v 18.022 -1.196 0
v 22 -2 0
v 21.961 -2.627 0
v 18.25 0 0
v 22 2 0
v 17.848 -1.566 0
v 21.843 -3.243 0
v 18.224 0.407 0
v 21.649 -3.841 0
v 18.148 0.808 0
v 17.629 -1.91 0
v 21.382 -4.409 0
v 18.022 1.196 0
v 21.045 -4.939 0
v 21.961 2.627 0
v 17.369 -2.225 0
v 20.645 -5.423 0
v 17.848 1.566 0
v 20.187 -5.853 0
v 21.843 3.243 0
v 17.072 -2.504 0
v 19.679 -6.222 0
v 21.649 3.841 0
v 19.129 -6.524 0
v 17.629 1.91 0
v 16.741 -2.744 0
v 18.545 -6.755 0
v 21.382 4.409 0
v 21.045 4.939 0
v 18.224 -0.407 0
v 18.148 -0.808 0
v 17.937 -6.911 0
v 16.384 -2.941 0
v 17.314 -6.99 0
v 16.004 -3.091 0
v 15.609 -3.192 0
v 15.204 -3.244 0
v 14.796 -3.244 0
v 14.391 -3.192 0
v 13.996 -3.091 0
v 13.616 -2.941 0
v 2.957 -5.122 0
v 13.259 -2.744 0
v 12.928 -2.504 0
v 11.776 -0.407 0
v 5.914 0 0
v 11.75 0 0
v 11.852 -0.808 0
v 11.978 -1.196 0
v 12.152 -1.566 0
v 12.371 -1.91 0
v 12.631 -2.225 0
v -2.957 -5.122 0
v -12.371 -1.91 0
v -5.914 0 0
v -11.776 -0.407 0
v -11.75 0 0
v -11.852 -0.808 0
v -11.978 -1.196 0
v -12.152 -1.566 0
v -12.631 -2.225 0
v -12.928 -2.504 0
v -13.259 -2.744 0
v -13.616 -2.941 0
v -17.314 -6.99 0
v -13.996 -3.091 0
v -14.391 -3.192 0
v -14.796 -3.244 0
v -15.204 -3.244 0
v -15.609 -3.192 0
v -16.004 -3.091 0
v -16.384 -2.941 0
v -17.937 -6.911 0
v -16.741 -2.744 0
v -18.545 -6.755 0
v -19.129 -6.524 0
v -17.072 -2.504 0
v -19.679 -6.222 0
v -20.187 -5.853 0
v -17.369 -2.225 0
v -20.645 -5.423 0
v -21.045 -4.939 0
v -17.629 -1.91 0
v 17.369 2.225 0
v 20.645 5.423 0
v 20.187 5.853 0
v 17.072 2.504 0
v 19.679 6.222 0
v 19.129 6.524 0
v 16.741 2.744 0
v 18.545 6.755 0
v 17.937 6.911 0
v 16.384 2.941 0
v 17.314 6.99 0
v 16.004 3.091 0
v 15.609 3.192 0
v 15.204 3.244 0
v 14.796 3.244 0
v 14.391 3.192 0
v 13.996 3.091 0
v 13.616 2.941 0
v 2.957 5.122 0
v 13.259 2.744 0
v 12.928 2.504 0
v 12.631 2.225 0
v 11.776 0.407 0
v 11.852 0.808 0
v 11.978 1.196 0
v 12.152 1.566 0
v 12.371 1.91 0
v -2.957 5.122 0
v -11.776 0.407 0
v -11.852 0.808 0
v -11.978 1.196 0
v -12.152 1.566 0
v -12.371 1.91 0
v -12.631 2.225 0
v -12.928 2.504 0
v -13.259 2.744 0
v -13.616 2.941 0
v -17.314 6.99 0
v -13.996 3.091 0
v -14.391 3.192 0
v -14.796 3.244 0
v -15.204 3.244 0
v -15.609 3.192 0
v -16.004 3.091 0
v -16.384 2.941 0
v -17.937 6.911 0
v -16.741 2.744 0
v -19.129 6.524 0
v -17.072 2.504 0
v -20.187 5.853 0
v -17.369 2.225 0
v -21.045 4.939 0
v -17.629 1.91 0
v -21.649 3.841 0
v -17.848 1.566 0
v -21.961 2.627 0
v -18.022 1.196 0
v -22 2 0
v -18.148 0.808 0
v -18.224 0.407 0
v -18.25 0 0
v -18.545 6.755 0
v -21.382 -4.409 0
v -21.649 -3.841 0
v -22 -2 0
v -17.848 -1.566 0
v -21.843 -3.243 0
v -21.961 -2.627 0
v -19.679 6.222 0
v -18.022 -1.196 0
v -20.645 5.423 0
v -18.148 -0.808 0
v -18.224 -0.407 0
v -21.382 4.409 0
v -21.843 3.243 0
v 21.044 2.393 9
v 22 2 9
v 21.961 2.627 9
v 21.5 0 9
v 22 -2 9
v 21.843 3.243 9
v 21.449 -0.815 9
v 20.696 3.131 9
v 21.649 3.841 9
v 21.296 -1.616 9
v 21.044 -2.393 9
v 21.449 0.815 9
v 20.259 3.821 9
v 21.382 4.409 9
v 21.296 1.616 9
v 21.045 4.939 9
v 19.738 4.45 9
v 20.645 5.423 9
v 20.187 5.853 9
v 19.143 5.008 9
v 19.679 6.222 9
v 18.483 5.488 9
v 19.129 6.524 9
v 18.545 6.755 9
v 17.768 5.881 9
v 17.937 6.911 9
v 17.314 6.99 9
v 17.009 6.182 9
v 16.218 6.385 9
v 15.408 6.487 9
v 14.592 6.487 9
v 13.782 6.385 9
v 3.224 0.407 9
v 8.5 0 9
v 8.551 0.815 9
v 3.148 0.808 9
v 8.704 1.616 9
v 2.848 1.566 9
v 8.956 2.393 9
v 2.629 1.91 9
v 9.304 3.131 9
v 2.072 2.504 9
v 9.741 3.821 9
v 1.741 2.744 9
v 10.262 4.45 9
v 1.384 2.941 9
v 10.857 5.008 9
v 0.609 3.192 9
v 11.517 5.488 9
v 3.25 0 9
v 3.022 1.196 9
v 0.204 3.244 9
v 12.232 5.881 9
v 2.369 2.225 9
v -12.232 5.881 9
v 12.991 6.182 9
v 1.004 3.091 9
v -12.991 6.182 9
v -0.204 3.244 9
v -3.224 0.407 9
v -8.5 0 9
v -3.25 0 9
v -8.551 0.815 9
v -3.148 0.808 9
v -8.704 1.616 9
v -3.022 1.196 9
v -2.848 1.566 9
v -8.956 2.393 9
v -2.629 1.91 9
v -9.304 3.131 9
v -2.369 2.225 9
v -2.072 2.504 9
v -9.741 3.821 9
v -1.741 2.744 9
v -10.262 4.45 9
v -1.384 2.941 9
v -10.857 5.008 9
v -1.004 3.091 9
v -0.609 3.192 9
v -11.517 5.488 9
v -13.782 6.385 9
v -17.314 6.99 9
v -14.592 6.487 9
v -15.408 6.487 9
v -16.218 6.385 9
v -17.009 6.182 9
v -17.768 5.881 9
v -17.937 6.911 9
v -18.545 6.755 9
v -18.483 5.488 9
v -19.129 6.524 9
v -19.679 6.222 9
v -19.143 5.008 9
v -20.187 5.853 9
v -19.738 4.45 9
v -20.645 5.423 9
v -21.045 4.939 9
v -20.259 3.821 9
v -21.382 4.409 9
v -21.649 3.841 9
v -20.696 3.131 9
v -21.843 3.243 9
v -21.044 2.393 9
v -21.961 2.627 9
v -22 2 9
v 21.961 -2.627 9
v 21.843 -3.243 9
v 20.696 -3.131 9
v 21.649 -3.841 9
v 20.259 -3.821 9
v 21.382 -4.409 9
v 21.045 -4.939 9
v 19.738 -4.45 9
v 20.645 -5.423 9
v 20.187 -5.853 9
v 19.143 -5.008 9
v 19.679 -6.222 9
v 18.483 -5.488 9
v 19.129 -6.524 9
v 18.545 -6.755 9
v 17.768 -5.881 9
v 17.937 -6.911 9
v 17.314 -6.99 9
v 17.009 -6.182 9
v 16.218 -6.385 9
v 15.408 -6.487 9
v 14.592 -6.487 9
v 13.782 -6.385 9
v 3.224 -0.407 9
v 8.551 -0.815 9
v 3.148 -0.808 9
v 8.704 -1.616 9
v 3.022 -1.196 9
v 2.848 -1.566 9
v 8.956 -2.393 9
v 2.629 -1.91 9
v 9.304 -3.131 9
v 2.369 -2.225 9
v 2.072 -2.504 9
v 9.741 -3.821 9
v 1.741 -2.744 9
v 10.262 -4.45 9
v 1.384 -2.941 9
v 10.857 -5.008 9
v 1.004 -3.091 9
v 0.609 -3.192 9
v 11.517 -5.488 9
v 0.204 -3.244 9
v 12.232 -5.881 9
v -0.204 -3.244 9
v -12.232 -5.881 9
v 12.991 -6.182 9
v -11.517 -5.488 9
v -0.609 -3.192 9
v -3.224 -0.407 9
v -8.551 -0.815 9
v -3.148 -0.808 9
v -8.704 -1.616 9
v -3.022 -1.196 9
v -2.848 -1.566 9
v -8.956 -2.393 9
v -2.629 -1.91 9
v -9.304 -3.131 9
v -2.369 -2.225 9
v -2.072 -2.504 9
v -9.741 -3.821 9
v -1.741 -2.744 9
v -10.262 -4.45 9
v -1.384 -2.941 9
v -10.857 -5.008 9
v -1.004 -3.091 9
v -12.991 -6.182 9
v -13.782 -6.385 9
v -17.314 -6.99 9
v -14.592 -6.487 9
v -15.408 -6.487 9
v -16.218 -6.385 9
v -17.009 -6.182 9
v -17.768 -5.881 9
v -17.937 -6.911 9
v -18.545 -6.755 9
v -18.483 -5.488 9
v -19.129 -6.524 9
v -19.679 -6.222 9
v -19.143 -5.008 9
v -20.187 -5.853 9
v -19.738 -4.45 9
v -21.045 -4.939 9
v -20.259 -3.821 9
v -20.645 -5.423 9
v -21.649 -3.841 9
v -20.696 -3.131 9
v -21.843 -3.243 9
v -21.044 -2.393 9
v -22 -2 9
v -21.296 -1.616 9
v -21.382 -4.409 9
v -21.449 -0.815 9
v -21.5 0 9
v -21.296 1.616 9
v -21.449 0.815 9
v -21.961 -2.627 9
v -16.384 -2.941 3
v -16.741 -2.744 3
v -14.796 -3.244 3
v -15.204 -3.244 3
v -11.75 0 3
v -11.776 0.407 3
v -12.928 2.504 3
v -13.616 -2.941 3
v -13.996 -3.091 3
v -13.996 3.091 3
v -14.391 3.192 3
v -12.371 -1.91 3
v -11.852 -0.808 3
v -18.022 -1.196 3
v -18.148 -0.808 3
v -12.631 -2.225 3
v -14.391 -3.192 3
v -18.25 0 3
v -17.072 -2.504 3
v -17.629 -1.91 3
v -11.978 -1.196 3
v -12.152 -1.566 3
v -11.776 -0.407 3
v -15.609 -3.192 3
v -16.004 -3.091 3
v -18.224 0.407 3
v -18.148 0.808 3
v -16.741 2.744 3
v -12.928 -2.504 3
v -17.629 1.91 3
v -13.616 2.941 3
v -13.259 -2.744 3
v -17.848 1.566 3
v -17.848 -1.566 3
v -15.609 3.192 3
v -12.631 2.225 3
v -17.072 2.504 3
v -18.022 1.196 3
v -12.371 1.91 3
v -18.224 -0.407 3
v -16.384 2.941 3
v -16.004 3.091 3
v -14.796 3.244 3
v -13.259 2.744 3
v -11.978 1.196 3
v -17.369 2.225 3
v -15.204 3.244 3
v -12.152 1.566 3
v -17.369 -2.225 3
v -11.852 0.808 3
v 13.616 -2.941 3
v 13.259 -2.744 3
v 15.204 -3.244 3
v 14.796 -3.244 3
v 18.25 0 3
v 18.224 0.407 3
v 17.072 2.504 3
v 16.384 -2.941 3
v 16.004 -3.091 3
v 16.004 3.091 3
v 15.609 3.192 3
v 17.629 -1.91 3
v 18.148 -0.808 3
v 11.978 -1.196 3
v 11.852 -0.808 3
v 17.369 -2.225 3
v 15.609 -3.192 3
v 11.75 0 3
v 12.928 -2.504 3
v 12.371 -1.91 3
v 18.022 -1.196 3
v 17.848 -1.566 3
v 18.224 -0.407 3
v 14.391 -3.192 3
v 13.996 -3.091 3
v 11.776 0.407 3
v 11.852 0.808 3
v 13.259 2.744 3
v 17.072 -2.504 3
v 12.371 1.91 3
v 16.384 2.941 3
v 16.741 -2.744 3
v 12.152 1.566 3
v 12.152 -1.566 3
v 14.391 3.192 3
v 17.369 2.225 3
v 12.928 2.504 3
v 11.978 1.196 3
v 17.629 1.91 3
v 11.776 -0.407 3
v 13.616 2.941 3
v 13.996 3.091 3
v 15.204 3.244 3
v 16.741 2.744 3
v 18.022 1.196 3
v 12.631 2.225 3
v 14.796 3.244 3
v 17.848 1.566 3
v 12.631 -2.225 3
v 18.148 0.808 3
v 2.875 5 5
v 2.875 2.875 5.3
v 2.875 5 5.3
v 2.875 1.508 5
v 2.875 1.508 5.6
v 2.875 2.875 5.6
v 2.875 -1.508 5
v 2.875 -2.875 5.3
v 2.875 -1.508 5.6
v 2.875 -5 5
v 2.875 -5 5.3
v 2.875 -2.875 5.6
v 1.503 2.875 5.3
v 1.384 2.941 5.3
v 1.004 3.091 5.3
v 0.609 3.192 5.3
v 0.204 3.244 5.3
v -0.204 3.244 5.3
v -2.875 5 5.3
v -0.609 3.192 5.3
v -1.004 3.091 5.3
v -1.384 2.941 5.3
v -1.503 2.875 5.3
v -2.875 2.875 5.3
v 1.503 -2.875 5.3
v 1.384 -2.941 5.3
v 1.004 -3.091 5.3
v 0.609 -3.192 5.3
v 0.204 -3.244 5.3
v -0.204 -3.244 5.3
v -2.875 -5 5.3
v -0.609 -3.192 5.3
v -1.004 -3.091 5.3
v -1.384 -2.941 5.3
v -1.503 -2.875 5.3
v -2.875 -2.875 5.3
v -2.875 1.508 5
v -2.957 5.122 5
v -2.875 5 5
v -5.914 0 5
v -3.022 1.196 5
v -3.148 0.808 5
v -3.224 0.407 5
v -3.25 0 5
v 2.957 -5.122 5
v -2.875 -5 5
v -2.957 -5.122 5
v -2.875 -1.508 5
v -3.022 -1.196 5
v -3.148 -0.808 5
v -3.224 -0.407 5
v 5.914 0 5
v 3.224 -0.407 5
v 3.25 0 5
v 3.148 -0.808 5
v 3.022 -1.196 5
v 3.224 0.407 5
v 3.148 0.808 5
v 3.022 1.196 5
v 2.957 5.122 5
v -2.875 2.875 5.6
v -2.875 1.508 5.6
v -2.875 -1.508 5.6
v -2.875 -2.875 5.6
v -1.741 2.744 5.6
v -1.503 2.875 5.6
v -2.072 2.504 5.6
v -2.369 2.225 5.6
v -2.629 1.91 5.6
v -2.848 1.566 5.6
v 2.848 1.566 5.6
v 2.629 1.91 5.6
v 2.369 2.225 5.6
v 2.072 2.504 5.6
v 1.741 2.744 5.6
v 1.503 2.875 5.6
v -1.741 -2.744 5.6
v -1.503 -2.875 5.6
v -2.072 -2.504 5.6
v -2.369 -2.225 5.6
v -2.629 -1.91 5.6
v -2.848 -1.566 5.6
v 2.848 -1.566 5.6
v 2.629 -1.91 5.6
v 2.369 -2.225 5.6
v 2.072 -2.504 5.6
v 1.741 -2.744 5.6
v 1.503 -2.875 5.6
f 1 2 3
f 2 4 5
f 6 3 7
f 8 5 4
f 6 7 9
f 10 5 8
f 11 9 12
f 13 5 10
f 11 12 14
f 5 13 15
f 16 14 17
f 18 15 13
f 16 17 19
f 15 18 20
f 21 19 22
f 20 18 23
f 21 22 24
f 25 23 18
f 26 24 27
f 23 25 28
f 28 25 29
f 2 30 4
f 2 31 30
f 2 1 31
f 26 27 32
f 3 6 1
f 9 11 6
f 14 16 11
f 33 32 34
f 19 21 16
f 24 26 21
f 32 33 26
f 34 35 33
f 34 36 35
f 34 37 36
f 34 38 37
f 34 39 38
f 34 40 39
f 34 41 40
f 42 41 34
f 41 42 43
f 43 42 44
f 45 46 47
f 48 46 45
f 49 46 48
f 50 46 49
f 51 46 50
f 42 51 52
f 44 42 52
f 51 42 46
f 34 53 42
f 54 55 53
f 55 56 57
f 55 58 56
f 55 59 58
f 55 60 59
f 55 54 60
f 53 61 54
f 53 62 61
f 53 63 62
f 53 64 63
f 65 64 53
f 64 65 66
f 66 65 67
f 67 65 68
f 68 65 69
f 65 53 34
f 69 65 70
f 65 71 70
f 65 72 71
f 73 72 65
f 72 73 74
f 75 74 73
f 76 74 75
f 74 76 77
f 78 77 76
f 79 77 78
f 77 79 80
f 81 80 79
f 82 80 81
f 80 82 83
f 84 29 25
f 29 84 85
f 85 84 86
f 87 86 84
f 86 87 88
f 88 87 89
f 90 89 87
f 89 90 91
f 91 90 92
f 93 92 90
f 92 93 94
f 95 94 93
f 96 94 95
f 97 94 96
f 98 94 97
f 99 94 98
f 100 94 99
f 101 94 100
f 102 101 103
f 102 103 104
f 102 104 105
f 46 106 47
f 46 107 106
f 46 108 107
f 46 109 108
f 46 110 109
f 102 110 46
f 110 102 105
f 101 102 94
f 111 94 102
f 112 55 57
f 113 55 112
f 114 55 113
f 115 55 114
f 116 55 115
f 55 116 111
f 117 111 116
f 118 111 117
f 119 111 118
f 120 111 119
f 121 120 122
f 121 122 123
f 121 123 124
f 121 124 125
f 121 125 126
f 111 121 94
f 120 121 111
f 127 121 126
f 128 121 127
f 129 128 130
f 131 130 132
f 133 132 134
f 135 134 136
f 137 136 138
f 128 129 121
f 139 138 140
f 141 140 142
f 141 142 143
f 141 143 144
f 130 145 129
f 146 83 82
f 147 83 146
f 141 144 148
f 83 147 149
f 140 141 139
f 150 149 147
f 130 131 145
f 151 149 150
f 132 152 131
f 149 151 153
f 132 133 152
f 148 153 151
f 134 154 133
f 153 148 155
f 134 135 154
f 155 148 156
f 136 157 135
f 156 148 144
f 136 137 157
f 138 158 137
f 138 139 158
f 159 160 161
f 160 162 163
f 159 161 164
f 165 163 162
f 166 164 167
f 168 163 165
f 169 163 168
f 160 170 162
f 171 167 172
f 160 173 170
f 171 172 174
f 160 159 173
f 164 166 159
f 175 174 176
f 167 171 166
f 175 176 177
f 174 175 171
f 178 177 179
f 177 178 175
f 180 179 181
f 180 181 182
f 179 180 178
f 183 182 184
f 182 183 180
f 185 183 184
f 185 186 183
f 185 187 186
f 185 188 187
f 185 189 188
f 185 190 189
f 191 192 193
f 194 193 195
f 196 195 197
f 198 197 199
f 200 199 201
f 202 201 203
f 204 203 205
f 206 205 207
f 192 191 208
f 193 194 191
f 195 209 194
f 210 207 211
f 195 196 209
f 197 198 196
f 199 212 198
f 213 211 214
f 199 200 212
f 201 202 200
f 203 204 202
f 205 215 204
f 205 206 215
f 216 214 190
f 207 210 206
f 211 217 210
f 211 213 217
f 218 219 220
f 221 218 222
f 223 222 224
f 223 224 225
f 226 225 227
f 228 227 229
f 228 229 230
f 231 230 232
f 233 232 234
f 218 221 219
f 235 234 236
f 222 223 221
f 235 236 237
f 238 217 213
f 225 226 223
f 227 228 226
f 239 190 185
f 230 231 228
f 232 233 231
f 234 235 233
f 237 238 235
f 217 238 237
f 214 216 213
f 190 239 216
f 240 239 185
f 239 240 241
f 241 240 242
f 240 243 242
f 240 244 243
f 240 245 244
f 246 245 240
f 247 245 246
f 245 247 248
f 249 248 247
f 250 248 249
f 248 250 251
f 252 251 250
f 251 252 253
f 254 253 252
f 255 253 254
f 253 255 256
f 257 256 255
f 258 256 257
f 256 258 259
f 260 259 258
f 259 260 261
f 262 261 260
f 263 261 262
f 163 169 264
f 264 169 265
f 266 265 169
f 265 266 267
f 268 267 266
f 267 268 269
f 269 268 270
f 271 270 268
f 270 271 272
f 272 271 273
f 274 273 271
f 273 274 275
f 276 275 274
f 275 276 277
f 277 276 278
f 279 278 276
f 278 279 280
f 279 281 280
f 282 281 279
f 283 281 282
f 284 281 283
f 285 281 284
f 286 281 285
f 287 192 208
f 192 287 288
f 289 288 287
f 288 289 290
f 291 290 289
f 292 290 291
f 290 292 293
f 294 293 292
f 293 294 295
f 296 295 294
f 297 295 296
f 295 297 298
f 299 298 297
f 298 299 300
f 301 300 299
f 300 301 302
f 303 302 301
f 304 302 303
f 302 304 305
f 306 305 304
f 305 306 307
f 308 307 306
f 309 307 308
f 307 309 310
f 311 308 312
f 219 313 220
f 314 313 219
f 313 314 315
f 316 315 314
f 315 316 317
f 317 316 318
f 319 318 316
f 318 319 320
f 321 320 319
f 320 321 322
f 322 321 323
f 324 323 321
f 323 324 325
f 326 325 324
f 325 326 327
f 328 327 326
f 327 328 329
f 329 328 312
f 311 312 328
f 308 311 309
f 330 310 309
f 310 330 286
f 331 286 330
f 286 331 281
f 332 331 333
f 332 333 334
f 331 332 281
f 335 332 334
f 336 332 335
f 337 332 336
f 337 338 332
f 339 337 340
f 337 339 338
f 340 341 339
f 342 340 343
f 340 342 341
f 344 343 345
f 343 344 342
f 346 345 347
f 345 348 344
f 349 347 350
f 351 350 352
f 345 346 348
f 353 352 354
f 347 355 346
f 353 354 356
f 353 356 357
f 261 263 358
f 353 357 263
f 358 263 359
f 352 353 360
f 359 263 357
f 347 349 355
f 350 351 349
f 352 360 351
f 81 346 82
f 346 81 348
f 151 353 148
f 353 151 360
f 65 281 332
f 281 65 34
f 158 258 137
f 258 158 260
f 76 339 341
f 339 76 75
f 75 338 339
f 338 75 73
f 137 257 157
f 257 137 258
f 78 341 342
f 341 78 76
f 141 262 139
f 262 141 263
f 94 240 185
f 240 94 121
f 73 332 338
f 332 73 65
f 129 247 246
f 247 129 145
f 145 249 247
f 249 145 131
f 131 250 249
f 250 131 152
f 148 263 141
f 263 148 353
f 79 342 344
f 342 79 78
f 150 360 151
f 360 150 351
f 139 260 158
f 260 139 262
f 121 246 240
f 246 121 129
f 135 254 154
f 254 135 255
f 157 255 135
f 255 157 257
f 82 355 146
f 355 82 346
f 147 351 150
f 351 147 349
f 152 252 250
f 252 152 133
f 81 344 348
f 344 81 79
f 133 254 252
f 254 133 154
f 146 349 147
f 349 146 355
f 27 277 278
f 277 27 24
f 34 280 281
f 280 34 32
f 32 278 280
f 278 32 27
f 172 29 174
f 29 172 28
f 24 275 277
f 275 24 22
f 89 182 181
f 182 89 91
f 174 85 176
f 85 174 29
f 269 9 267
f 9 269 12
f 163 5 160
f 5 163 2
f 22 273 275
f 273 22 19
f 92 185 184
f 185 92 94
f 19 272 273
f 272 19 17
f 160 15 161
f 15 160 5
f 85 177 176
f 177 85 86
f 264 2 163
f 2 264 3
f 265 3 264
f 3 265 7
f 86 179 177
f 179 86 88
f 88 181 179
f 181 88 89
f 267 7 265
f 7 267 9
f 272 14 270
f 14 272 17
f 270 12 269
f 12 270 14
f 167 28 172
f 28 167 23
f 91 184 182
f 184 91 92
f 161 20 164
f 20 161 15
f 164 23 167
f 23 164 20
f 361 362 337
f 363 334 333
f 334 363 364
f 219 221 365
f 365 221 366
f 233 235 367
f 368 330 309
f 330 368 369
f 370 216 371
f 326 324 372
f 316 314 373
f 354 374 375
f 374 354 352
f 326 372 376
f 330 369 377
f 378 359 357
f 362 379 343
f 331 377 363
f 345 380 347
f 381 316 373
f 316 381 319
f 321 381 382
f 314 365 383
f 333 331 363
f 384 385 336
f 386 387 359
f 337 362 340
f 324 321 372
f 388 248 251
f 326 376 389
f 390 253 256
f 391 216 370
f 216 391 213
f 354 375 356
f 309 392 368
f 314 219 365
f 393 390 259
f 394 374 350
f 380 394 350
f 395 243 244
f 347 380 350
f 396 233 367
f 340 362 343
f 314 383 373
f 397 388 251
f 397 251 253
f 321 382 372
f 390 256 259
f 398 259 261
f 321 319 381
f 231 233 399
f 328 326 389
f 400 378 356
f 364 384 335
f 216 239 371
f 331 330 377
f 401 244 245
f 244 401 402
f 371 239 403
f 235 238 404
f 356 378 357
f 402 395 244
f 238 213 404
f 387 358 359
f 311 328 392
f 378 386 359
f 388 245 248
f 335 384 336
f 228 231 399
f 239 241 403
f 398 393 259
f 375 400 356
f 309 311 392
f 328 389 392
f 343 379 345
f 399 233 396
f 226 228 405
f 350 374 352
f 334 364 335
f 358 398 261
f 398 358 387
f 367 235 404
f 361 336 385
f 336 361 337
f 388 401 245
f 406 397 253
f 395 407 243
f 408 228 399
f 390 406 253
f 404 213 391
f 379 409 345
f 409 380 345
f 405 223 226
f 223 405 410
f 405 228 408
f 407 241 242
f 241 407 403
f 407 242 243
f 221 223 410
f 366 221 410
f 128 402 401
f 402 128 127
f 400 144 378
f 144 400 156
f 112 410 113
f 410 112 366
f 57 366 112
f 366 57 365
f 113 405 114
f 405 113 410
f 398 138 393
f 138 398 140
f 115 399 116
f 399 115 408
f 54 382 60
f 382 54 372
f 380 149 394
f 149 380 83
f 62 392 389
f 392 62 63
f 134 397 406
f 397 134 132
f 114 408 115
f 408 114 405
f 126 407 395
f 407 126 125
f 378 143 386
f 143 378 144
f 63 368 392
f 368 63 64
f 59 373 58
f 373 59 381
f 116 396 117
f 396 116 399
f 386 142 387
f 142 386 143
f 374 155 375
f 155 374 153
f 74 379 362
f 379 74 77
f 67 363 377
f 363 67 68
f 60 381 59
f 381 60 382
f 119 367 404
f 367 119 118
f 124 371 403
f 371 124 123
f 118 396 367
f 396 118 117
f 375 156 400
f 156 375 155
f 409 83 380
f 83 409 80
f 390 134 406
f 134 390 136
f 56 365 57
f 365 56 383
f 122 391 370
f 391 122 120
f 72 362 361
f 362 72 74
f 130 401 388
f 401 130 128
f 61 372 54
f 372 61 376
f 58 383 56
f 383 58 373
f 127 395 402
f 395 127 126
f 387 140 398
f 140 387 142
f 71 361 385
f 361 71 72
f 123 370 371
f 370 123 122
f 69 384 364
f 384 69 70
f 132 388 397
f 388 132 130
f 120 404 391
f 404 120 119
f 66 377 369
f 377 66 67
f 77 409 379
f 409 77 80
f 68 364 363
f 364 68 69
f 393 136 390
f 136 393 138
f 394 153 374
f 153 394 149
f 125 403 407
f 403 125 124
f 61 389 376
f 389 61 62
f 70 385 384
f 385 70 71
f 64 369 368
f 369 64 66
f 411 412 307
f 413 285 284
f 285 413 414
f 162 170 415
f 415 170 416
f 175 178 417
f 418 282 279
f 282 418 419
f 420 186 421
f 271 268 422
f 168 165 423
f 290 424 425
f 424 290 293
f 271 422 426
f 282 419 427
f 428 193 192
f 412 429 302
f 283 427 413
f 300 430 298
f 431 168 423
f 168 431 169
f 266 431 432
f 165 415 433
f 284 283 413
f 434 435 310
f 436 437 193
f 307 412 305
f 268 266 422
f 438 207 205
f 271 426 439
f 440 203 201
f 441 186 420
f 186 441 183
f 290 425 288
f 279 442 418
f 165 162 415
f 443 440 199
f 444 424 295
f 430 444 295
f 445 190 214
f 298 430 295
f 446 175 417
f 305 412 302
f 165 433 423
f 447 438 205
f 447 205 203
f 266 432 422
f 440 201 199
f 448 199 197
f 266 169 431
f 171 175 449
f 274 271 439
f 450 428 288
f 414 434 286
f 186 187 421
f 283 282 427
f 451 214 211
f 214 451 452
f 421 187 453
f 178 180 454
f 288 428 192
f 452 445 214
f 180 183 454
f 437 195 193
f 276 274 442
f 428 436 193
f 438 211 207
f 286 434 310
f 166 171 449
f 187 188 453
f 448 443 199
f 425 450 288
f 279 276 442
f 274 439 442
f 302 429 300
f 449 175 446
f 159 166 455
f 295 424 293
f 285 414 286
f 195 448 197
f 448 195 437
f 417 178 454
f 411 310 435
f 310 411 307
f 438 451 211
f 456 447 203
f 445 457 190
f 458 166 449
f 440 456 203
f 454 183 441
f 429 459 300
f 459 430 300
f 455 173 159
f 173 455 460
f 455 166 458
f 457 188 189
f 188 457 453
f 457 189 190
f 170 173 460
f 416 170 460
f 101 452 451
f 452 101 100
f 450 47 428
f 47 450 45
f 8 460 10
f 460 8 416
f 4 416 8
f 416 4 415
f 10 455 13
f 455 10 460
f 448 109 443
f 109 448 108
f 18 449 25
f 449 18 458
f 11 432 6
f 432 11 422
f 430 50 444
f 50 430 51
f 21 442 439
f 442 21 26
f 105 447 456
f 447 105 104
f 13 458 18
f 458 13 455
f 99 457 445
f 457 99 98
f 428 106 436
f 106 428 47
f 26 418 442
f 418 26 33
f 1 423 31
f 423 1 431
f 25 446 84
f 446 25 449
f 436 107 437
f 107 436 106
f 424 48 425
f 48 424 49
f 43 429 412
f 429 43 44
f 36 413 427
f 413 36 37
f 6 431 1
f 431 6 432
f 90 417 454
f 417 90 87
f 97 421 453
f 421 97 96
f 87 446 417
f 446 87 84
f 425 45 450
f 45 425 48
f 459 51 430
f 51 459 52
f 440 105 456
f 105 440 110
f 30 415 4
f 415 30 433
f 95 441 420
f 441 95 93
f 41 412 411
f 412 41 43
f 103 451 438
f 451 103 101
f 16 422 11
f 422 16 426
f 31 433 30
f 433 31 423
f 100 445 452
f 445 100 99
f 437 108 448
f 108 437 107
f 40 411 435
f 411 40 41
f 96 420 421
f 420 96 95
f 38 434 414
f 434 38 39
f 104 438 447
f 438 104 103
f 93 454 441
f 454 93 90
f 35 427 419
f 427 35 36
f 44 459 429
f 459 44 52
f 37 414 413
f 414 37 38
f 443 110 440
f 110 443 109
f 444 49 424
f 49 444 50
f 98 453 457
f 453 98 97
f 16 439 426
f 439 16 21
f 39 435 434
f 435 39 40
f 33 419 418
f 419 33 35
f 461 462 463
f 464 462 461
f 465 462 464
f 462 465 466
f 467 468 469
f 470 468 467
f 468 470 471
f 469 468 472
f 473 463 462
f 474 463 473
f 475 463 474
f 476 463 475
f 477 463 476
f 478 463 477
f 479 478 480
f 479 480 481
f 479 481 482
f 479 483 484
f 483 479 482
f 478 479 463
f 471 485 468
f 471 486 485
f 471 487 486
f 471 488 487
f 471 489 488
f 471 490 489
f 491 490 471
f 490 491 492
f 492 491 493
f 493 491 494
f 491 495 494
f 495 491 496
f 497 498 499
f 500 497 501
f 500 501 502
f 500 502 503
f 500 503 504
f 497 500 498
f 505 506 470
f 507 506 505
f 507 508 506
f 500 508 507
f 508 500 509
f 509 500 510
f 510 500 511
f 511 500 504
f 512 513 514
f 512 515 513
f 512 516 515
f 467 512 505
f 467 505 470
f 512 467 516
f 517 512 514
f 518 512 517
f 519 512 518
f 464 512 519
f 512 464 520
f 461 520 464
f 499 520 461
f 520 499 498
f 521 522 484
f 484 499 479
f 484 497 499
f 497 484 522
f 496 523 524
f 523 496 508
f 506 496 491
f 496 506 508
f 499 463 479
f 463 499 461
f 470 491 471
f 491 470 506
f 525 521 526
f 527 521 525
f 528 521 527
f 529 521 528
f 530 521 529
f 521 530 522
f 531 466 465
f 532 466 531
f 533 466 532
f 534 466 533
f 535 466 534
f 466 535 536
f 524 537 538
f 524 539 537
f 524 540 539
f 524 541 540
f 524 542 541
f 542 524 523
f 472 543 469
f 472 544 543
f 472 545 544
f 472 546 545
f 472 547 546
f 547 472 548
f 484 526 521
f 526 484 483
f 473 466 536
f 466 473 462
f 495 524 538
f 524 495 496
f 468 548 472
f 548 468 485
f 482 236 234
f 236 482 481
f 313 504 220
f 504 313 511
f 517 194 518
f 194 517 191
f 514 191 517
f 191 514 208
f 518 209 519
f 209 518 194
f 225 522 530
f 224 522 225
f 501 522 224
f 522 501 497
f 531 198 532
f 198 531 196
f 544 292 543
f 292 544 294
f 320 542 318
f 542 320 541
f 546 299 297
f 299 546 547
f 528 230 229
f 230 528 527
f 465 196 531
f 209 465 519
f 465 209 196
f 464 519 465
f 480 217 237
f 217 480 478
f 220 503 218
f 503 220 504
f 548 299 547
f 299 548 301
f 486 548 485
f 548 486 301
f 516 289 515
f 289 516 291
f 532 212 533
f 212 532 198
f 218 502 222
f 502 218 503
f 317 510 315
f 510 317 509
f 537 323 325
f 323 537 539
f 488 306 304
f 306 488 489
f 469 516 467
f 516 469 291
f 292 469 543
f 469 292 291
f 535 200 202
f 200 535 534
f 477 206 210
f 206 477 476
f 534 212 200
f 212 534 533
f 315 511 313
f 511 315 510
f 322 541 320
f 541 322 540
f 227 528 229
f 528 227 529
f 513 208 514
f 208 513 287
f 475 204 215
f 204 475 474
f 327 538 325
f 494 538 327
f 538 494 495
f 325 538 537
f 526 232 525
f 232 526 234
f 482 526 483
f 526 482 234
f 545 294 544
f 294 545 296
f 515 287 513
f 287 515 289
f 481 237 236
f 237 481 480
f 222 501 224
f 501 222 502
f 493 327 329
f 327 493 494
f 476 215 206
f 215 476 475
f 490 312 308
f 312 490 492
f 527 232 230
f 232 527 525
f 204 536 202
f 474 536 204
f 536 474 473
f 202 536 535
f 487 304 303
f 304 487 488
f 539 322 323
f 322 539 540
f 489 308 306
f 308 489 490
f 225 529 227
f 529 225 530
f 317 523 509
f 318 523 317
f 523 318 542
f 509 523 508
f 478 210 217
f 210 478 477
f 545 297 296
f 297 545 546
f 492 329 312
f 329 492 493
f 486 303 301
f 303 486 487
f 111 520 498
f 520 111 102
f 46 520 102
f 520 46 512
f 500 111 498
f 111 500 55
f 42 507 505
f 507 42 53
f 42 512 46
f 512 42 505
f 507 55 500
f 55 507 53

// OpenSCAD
$fn = 50;


difference() {
	union() {
		cylinder(h = 9, r = 7.0000000000);
		translate(v = [-7.5000000000, 0.0000000000, 0]) {
			hull() {
				translate(v = [-9.5000000000, 2.0000000000, 0]) {
					cylinder(h = 9, r = 5);
				}
				translate(v = [9.5000000000, 2.0000000000, 0]) {
					cylinder(h = 9, r = 5);
				}
				translate(v = [-9.5000000000, -2.0000000000, 0]) {
					cylinder(h = 9, r = 5);
				}
				translate(v = [9.5000000000, -2.0000000000, 0]) {
					cylinder(h = 9, r = 5);
				}
			}
		}
		translate(v = [-7.5000000000, 0.0000000000, 0]) {
			hull() {
				translate(v = [-9.5000000000, 2.0000000000, 0]) {
					cylinder(h = 9, r = 5);
				}
				translate(v = [9.5000000000, 2.0000000000, 0]) {
					cylinder(h = 9, r = 5);
				}
				translate(v = [-9.5000000000, -2.0000000000, 0]) {
					cylinder(h = 9, r = 5);
				}
				translate(v = [9.5000000000, -2.0000000000, 0]) {
					cylinder(h = 9, r = 5);
				}
			}
		}
		translate(v = [7.5000000000, 0.0000000000, 0]) {
			hull() {
				translate(v = [-9.5000000000, 2.0000000000, 0]) {
					cylinder(h = 9, r = 5);
				}
				translate(v = [9.5000000000, 2.0000000000, 0]) {
					cylinder(h = 9, r = 5);
				}
				translate(v = [-9.5000000000, -2.0000000000, 0]) {
					cylinder(h = 9, r = 5);
				}
				translate(v = [9.5000000000, -2.0000000000, 0]) {
					cylinder(h = 9, r = 5);
				}
			}
		}
		translate(v = [7.5000000000, 0.0000000000, 0]) {
			hull() {
				translate(v = [-9.5000000000, 2.0000000000, 0]) {
					cylinder(h = 9, r = 5);
				}
				translate(v = [9.5000000000, 2.0000000000, 0]) {
					cylinder(h = 9, r = 5);
				}
				translate(v = [-9.5000000000, -2.0000000000, 0]) {
					cylinder(h = 9, r = 5);
				}
				translate(v = [9.5000000000, -2.0000000000, 0]) {
					cylinder(h = 9, r = 5);
				}
			}
		}
	}
	union() {
		translate(v = [-15.0000000000, 0.0000000000, 9]) {
			rotate(a = [0, 0, 0]) {
				difference() {
					union() {
						#translate(v = [0, 0, -9.0000000000]) {
							cylinder(h = 9, r = 2.2500000000);
						}
						#translate(v = [0, 0, -6]) {
							cylinder(h = 6, r1 = 3.2500000000, r2 = 6.5000000000);
						}
						#translate(v = [0, 0, -9.0000000000]) {
							cylinder(h = 9, r = 3.2500000000);
						}
						#translate(v = [0, 0, -9.0000000000]) {
							cylinder(h = 9, r = 2.2500000000);
						}
					}
					union();
				}
			}
		}
		translate(v = [-15.0000000000, 0.0000000000, 9]) {
			rotate(a = [0, 0, 0]) {
				difference() {
					union() {
						#translate(v = [0, 0, -9.0000000000]) {
							cylinder(h = 9, r = 2.2500000000);
						}
						#translate(v = [0, 0, -6]) {
							cylinder(h = 6, r1 = 3.2500000000, r2 = 6.5000000000);
						}
						#translate(v = [0, 0, -9.0000000000]) {
							cylinder(h = 9, r = 3.2500000000);
						}
						#translate(v = [0, 0, -9.0000000000]) {
							cylinder(h = 9, r = 2.2500000000);
						}
					}
					union();
				}
			}
		}
		translate(v = [15.0000000000, 0.0000000000, 9]) {
			rotate(a = [0, 0, 0]) {
				difference() {
					union() {
						#translate(v = [0, 0, -9.0000000000]) {
							cylinder(h = 9, r = 2.2500000000);
						}
						#translate(v = [0, 0, -6]) {
							cylinder(h = 6, r1 = 3.2500000000, r2 = 6.5000000000);
						}
						#translate(v = [0, 0, -9.0000000000]) {
							cylinder(h = 9, r = 3.2500000000);
						}
						#translate(v = [0, 0, -9.0000000000]) {
							cylinder(h = 9, r = 2.2500000000);
						}
					}
					union();
				}
			}
		}
		translate(v = [15.0000000000, 0.0000000000, 9]) {
			rotate(a = [0, 0, 0]) {
				difference() {
					union() {
						#translate(v = [0, 0, -9.0000000000]) {
							cylinder(h = 9, r = 2.2500000000);
						}
						#translate(v = [0, 0, -6]) {
							cylinder(h = 6, r1 = 3.2500000000, r2 = 6.5000000000);
						}
						#translate(v = [0, 0, -9.0000000000]) {
							cylinder(h = 9, r = 3.2500000000);
						}
						#translate(v = [0, 0, -9.0000000000]) {
							cylinder(h = 9, r = 2.2500000000);
						}
					}
					union();
				}
			}
		}
		translate(v = [0.0000000000, 0.0000000000, 0]) {
			rotate(a = [0, 0, 0]) {
				difference() {
					union() {
						#translate(v = [-2.8750000000, -5.0000000000, -0.3000000000]) {
							cube(size = [5.7500000000, 10, 0.3000000000]);
						}
						#translate(v = [-2.8750000000, -2.8750000000, -0.6000000000]) {
							cube(size = [5.7500000000, 5.7500000000, 0.3000000000]);
						}
						#translate(v = [-2.8750000000, -5.0000000000, 5]) {
							cube(size = [5.7500000000, 10, 0.3000000000]);
						}
						#translate(v = [-2.8750000000, -2.8750000000, 5.3000000000]) {
							cube(size = [5.7500000000, 5.7500000000, 0.3000000000]);
						}
						#translate(v = [0, 0, -100.0000000000]) {
							cylinder(h = 200, r = 3.2500000000);
						}
						#linear_extrude(height = 5) {
							polygon(points = [[5.9142500000, 0.0000000000], [2.9571250000, 5.1218907443], [-2.9571250000, 5.1218907443], [-5.9142500000, 0.0000000000], [-2.9571250000, -5.1218907443], [2.9571250000, -5.1218907443]]);
						}
						#translate(v = [-2.8750000000, -5.0000000000, -0.3000000000]) {
							cube(size = [5.7500000000, 10, 0.3000000000]);
						}
						#translate(v = [-2.8750000000, -2.8750000000, -0.6000000000]) {
							cube(size = [5.7500000000, 5.7500000000, 0.3000000000]);
						}
						#translate(v = [-2.8750000000, -5.0000000000, 5]) {
							cube(size = [5.7500000000, 10, 0.3000000000]);
						}
						#translate(v = [-2.8750000000, -2.8750000000, 5.3000000000]) {
							cube(size = [5.7500000000, 5.7500000000, 0.3000000000]);
						}
						#translate(v = [0, 0, -100.0000000000]) {
							cylinder(h = 200, r = 3.2500000000);
						}
						#translate(v = [-2.8750000000, -5.0000000000, -0.3000000000]) {
							cube(size = [5.7500000000, 10, 0.3000000000]);
						}
						#translate(v = [-2.8750000000, -2.8750000000, -0.6000000000]) {
							cube(size = [5.7500000000, 5.7500000000, 0.3000000000]);
						}
						#translate(v = [-2.8750000000, -5.0000000000, 5]) {
							cube(size = [5.7500000000, 10, 0.3000000000]);
						}
						#translate(v = [-2.8750000000, -2.8750000000, 5.3000000000]) {
							cube(size = [5.7500000000, 5.7500000000, 0.3000000000]);
						}
						#translate(v = [0, 0, -100.0000000000]) {
							cylinder(h = 200, r = 3.2500000000);
						}
					}
					union();
				}
			}
		}
		translate(v = [0, 0, -100]) {
			cylinder(h = 200, r = 3.2500000000);
		}
		translate(v = [0, 0, -100]) {
			cylinder(h = 200, r = 1.8000000000);
		}
	}
}
